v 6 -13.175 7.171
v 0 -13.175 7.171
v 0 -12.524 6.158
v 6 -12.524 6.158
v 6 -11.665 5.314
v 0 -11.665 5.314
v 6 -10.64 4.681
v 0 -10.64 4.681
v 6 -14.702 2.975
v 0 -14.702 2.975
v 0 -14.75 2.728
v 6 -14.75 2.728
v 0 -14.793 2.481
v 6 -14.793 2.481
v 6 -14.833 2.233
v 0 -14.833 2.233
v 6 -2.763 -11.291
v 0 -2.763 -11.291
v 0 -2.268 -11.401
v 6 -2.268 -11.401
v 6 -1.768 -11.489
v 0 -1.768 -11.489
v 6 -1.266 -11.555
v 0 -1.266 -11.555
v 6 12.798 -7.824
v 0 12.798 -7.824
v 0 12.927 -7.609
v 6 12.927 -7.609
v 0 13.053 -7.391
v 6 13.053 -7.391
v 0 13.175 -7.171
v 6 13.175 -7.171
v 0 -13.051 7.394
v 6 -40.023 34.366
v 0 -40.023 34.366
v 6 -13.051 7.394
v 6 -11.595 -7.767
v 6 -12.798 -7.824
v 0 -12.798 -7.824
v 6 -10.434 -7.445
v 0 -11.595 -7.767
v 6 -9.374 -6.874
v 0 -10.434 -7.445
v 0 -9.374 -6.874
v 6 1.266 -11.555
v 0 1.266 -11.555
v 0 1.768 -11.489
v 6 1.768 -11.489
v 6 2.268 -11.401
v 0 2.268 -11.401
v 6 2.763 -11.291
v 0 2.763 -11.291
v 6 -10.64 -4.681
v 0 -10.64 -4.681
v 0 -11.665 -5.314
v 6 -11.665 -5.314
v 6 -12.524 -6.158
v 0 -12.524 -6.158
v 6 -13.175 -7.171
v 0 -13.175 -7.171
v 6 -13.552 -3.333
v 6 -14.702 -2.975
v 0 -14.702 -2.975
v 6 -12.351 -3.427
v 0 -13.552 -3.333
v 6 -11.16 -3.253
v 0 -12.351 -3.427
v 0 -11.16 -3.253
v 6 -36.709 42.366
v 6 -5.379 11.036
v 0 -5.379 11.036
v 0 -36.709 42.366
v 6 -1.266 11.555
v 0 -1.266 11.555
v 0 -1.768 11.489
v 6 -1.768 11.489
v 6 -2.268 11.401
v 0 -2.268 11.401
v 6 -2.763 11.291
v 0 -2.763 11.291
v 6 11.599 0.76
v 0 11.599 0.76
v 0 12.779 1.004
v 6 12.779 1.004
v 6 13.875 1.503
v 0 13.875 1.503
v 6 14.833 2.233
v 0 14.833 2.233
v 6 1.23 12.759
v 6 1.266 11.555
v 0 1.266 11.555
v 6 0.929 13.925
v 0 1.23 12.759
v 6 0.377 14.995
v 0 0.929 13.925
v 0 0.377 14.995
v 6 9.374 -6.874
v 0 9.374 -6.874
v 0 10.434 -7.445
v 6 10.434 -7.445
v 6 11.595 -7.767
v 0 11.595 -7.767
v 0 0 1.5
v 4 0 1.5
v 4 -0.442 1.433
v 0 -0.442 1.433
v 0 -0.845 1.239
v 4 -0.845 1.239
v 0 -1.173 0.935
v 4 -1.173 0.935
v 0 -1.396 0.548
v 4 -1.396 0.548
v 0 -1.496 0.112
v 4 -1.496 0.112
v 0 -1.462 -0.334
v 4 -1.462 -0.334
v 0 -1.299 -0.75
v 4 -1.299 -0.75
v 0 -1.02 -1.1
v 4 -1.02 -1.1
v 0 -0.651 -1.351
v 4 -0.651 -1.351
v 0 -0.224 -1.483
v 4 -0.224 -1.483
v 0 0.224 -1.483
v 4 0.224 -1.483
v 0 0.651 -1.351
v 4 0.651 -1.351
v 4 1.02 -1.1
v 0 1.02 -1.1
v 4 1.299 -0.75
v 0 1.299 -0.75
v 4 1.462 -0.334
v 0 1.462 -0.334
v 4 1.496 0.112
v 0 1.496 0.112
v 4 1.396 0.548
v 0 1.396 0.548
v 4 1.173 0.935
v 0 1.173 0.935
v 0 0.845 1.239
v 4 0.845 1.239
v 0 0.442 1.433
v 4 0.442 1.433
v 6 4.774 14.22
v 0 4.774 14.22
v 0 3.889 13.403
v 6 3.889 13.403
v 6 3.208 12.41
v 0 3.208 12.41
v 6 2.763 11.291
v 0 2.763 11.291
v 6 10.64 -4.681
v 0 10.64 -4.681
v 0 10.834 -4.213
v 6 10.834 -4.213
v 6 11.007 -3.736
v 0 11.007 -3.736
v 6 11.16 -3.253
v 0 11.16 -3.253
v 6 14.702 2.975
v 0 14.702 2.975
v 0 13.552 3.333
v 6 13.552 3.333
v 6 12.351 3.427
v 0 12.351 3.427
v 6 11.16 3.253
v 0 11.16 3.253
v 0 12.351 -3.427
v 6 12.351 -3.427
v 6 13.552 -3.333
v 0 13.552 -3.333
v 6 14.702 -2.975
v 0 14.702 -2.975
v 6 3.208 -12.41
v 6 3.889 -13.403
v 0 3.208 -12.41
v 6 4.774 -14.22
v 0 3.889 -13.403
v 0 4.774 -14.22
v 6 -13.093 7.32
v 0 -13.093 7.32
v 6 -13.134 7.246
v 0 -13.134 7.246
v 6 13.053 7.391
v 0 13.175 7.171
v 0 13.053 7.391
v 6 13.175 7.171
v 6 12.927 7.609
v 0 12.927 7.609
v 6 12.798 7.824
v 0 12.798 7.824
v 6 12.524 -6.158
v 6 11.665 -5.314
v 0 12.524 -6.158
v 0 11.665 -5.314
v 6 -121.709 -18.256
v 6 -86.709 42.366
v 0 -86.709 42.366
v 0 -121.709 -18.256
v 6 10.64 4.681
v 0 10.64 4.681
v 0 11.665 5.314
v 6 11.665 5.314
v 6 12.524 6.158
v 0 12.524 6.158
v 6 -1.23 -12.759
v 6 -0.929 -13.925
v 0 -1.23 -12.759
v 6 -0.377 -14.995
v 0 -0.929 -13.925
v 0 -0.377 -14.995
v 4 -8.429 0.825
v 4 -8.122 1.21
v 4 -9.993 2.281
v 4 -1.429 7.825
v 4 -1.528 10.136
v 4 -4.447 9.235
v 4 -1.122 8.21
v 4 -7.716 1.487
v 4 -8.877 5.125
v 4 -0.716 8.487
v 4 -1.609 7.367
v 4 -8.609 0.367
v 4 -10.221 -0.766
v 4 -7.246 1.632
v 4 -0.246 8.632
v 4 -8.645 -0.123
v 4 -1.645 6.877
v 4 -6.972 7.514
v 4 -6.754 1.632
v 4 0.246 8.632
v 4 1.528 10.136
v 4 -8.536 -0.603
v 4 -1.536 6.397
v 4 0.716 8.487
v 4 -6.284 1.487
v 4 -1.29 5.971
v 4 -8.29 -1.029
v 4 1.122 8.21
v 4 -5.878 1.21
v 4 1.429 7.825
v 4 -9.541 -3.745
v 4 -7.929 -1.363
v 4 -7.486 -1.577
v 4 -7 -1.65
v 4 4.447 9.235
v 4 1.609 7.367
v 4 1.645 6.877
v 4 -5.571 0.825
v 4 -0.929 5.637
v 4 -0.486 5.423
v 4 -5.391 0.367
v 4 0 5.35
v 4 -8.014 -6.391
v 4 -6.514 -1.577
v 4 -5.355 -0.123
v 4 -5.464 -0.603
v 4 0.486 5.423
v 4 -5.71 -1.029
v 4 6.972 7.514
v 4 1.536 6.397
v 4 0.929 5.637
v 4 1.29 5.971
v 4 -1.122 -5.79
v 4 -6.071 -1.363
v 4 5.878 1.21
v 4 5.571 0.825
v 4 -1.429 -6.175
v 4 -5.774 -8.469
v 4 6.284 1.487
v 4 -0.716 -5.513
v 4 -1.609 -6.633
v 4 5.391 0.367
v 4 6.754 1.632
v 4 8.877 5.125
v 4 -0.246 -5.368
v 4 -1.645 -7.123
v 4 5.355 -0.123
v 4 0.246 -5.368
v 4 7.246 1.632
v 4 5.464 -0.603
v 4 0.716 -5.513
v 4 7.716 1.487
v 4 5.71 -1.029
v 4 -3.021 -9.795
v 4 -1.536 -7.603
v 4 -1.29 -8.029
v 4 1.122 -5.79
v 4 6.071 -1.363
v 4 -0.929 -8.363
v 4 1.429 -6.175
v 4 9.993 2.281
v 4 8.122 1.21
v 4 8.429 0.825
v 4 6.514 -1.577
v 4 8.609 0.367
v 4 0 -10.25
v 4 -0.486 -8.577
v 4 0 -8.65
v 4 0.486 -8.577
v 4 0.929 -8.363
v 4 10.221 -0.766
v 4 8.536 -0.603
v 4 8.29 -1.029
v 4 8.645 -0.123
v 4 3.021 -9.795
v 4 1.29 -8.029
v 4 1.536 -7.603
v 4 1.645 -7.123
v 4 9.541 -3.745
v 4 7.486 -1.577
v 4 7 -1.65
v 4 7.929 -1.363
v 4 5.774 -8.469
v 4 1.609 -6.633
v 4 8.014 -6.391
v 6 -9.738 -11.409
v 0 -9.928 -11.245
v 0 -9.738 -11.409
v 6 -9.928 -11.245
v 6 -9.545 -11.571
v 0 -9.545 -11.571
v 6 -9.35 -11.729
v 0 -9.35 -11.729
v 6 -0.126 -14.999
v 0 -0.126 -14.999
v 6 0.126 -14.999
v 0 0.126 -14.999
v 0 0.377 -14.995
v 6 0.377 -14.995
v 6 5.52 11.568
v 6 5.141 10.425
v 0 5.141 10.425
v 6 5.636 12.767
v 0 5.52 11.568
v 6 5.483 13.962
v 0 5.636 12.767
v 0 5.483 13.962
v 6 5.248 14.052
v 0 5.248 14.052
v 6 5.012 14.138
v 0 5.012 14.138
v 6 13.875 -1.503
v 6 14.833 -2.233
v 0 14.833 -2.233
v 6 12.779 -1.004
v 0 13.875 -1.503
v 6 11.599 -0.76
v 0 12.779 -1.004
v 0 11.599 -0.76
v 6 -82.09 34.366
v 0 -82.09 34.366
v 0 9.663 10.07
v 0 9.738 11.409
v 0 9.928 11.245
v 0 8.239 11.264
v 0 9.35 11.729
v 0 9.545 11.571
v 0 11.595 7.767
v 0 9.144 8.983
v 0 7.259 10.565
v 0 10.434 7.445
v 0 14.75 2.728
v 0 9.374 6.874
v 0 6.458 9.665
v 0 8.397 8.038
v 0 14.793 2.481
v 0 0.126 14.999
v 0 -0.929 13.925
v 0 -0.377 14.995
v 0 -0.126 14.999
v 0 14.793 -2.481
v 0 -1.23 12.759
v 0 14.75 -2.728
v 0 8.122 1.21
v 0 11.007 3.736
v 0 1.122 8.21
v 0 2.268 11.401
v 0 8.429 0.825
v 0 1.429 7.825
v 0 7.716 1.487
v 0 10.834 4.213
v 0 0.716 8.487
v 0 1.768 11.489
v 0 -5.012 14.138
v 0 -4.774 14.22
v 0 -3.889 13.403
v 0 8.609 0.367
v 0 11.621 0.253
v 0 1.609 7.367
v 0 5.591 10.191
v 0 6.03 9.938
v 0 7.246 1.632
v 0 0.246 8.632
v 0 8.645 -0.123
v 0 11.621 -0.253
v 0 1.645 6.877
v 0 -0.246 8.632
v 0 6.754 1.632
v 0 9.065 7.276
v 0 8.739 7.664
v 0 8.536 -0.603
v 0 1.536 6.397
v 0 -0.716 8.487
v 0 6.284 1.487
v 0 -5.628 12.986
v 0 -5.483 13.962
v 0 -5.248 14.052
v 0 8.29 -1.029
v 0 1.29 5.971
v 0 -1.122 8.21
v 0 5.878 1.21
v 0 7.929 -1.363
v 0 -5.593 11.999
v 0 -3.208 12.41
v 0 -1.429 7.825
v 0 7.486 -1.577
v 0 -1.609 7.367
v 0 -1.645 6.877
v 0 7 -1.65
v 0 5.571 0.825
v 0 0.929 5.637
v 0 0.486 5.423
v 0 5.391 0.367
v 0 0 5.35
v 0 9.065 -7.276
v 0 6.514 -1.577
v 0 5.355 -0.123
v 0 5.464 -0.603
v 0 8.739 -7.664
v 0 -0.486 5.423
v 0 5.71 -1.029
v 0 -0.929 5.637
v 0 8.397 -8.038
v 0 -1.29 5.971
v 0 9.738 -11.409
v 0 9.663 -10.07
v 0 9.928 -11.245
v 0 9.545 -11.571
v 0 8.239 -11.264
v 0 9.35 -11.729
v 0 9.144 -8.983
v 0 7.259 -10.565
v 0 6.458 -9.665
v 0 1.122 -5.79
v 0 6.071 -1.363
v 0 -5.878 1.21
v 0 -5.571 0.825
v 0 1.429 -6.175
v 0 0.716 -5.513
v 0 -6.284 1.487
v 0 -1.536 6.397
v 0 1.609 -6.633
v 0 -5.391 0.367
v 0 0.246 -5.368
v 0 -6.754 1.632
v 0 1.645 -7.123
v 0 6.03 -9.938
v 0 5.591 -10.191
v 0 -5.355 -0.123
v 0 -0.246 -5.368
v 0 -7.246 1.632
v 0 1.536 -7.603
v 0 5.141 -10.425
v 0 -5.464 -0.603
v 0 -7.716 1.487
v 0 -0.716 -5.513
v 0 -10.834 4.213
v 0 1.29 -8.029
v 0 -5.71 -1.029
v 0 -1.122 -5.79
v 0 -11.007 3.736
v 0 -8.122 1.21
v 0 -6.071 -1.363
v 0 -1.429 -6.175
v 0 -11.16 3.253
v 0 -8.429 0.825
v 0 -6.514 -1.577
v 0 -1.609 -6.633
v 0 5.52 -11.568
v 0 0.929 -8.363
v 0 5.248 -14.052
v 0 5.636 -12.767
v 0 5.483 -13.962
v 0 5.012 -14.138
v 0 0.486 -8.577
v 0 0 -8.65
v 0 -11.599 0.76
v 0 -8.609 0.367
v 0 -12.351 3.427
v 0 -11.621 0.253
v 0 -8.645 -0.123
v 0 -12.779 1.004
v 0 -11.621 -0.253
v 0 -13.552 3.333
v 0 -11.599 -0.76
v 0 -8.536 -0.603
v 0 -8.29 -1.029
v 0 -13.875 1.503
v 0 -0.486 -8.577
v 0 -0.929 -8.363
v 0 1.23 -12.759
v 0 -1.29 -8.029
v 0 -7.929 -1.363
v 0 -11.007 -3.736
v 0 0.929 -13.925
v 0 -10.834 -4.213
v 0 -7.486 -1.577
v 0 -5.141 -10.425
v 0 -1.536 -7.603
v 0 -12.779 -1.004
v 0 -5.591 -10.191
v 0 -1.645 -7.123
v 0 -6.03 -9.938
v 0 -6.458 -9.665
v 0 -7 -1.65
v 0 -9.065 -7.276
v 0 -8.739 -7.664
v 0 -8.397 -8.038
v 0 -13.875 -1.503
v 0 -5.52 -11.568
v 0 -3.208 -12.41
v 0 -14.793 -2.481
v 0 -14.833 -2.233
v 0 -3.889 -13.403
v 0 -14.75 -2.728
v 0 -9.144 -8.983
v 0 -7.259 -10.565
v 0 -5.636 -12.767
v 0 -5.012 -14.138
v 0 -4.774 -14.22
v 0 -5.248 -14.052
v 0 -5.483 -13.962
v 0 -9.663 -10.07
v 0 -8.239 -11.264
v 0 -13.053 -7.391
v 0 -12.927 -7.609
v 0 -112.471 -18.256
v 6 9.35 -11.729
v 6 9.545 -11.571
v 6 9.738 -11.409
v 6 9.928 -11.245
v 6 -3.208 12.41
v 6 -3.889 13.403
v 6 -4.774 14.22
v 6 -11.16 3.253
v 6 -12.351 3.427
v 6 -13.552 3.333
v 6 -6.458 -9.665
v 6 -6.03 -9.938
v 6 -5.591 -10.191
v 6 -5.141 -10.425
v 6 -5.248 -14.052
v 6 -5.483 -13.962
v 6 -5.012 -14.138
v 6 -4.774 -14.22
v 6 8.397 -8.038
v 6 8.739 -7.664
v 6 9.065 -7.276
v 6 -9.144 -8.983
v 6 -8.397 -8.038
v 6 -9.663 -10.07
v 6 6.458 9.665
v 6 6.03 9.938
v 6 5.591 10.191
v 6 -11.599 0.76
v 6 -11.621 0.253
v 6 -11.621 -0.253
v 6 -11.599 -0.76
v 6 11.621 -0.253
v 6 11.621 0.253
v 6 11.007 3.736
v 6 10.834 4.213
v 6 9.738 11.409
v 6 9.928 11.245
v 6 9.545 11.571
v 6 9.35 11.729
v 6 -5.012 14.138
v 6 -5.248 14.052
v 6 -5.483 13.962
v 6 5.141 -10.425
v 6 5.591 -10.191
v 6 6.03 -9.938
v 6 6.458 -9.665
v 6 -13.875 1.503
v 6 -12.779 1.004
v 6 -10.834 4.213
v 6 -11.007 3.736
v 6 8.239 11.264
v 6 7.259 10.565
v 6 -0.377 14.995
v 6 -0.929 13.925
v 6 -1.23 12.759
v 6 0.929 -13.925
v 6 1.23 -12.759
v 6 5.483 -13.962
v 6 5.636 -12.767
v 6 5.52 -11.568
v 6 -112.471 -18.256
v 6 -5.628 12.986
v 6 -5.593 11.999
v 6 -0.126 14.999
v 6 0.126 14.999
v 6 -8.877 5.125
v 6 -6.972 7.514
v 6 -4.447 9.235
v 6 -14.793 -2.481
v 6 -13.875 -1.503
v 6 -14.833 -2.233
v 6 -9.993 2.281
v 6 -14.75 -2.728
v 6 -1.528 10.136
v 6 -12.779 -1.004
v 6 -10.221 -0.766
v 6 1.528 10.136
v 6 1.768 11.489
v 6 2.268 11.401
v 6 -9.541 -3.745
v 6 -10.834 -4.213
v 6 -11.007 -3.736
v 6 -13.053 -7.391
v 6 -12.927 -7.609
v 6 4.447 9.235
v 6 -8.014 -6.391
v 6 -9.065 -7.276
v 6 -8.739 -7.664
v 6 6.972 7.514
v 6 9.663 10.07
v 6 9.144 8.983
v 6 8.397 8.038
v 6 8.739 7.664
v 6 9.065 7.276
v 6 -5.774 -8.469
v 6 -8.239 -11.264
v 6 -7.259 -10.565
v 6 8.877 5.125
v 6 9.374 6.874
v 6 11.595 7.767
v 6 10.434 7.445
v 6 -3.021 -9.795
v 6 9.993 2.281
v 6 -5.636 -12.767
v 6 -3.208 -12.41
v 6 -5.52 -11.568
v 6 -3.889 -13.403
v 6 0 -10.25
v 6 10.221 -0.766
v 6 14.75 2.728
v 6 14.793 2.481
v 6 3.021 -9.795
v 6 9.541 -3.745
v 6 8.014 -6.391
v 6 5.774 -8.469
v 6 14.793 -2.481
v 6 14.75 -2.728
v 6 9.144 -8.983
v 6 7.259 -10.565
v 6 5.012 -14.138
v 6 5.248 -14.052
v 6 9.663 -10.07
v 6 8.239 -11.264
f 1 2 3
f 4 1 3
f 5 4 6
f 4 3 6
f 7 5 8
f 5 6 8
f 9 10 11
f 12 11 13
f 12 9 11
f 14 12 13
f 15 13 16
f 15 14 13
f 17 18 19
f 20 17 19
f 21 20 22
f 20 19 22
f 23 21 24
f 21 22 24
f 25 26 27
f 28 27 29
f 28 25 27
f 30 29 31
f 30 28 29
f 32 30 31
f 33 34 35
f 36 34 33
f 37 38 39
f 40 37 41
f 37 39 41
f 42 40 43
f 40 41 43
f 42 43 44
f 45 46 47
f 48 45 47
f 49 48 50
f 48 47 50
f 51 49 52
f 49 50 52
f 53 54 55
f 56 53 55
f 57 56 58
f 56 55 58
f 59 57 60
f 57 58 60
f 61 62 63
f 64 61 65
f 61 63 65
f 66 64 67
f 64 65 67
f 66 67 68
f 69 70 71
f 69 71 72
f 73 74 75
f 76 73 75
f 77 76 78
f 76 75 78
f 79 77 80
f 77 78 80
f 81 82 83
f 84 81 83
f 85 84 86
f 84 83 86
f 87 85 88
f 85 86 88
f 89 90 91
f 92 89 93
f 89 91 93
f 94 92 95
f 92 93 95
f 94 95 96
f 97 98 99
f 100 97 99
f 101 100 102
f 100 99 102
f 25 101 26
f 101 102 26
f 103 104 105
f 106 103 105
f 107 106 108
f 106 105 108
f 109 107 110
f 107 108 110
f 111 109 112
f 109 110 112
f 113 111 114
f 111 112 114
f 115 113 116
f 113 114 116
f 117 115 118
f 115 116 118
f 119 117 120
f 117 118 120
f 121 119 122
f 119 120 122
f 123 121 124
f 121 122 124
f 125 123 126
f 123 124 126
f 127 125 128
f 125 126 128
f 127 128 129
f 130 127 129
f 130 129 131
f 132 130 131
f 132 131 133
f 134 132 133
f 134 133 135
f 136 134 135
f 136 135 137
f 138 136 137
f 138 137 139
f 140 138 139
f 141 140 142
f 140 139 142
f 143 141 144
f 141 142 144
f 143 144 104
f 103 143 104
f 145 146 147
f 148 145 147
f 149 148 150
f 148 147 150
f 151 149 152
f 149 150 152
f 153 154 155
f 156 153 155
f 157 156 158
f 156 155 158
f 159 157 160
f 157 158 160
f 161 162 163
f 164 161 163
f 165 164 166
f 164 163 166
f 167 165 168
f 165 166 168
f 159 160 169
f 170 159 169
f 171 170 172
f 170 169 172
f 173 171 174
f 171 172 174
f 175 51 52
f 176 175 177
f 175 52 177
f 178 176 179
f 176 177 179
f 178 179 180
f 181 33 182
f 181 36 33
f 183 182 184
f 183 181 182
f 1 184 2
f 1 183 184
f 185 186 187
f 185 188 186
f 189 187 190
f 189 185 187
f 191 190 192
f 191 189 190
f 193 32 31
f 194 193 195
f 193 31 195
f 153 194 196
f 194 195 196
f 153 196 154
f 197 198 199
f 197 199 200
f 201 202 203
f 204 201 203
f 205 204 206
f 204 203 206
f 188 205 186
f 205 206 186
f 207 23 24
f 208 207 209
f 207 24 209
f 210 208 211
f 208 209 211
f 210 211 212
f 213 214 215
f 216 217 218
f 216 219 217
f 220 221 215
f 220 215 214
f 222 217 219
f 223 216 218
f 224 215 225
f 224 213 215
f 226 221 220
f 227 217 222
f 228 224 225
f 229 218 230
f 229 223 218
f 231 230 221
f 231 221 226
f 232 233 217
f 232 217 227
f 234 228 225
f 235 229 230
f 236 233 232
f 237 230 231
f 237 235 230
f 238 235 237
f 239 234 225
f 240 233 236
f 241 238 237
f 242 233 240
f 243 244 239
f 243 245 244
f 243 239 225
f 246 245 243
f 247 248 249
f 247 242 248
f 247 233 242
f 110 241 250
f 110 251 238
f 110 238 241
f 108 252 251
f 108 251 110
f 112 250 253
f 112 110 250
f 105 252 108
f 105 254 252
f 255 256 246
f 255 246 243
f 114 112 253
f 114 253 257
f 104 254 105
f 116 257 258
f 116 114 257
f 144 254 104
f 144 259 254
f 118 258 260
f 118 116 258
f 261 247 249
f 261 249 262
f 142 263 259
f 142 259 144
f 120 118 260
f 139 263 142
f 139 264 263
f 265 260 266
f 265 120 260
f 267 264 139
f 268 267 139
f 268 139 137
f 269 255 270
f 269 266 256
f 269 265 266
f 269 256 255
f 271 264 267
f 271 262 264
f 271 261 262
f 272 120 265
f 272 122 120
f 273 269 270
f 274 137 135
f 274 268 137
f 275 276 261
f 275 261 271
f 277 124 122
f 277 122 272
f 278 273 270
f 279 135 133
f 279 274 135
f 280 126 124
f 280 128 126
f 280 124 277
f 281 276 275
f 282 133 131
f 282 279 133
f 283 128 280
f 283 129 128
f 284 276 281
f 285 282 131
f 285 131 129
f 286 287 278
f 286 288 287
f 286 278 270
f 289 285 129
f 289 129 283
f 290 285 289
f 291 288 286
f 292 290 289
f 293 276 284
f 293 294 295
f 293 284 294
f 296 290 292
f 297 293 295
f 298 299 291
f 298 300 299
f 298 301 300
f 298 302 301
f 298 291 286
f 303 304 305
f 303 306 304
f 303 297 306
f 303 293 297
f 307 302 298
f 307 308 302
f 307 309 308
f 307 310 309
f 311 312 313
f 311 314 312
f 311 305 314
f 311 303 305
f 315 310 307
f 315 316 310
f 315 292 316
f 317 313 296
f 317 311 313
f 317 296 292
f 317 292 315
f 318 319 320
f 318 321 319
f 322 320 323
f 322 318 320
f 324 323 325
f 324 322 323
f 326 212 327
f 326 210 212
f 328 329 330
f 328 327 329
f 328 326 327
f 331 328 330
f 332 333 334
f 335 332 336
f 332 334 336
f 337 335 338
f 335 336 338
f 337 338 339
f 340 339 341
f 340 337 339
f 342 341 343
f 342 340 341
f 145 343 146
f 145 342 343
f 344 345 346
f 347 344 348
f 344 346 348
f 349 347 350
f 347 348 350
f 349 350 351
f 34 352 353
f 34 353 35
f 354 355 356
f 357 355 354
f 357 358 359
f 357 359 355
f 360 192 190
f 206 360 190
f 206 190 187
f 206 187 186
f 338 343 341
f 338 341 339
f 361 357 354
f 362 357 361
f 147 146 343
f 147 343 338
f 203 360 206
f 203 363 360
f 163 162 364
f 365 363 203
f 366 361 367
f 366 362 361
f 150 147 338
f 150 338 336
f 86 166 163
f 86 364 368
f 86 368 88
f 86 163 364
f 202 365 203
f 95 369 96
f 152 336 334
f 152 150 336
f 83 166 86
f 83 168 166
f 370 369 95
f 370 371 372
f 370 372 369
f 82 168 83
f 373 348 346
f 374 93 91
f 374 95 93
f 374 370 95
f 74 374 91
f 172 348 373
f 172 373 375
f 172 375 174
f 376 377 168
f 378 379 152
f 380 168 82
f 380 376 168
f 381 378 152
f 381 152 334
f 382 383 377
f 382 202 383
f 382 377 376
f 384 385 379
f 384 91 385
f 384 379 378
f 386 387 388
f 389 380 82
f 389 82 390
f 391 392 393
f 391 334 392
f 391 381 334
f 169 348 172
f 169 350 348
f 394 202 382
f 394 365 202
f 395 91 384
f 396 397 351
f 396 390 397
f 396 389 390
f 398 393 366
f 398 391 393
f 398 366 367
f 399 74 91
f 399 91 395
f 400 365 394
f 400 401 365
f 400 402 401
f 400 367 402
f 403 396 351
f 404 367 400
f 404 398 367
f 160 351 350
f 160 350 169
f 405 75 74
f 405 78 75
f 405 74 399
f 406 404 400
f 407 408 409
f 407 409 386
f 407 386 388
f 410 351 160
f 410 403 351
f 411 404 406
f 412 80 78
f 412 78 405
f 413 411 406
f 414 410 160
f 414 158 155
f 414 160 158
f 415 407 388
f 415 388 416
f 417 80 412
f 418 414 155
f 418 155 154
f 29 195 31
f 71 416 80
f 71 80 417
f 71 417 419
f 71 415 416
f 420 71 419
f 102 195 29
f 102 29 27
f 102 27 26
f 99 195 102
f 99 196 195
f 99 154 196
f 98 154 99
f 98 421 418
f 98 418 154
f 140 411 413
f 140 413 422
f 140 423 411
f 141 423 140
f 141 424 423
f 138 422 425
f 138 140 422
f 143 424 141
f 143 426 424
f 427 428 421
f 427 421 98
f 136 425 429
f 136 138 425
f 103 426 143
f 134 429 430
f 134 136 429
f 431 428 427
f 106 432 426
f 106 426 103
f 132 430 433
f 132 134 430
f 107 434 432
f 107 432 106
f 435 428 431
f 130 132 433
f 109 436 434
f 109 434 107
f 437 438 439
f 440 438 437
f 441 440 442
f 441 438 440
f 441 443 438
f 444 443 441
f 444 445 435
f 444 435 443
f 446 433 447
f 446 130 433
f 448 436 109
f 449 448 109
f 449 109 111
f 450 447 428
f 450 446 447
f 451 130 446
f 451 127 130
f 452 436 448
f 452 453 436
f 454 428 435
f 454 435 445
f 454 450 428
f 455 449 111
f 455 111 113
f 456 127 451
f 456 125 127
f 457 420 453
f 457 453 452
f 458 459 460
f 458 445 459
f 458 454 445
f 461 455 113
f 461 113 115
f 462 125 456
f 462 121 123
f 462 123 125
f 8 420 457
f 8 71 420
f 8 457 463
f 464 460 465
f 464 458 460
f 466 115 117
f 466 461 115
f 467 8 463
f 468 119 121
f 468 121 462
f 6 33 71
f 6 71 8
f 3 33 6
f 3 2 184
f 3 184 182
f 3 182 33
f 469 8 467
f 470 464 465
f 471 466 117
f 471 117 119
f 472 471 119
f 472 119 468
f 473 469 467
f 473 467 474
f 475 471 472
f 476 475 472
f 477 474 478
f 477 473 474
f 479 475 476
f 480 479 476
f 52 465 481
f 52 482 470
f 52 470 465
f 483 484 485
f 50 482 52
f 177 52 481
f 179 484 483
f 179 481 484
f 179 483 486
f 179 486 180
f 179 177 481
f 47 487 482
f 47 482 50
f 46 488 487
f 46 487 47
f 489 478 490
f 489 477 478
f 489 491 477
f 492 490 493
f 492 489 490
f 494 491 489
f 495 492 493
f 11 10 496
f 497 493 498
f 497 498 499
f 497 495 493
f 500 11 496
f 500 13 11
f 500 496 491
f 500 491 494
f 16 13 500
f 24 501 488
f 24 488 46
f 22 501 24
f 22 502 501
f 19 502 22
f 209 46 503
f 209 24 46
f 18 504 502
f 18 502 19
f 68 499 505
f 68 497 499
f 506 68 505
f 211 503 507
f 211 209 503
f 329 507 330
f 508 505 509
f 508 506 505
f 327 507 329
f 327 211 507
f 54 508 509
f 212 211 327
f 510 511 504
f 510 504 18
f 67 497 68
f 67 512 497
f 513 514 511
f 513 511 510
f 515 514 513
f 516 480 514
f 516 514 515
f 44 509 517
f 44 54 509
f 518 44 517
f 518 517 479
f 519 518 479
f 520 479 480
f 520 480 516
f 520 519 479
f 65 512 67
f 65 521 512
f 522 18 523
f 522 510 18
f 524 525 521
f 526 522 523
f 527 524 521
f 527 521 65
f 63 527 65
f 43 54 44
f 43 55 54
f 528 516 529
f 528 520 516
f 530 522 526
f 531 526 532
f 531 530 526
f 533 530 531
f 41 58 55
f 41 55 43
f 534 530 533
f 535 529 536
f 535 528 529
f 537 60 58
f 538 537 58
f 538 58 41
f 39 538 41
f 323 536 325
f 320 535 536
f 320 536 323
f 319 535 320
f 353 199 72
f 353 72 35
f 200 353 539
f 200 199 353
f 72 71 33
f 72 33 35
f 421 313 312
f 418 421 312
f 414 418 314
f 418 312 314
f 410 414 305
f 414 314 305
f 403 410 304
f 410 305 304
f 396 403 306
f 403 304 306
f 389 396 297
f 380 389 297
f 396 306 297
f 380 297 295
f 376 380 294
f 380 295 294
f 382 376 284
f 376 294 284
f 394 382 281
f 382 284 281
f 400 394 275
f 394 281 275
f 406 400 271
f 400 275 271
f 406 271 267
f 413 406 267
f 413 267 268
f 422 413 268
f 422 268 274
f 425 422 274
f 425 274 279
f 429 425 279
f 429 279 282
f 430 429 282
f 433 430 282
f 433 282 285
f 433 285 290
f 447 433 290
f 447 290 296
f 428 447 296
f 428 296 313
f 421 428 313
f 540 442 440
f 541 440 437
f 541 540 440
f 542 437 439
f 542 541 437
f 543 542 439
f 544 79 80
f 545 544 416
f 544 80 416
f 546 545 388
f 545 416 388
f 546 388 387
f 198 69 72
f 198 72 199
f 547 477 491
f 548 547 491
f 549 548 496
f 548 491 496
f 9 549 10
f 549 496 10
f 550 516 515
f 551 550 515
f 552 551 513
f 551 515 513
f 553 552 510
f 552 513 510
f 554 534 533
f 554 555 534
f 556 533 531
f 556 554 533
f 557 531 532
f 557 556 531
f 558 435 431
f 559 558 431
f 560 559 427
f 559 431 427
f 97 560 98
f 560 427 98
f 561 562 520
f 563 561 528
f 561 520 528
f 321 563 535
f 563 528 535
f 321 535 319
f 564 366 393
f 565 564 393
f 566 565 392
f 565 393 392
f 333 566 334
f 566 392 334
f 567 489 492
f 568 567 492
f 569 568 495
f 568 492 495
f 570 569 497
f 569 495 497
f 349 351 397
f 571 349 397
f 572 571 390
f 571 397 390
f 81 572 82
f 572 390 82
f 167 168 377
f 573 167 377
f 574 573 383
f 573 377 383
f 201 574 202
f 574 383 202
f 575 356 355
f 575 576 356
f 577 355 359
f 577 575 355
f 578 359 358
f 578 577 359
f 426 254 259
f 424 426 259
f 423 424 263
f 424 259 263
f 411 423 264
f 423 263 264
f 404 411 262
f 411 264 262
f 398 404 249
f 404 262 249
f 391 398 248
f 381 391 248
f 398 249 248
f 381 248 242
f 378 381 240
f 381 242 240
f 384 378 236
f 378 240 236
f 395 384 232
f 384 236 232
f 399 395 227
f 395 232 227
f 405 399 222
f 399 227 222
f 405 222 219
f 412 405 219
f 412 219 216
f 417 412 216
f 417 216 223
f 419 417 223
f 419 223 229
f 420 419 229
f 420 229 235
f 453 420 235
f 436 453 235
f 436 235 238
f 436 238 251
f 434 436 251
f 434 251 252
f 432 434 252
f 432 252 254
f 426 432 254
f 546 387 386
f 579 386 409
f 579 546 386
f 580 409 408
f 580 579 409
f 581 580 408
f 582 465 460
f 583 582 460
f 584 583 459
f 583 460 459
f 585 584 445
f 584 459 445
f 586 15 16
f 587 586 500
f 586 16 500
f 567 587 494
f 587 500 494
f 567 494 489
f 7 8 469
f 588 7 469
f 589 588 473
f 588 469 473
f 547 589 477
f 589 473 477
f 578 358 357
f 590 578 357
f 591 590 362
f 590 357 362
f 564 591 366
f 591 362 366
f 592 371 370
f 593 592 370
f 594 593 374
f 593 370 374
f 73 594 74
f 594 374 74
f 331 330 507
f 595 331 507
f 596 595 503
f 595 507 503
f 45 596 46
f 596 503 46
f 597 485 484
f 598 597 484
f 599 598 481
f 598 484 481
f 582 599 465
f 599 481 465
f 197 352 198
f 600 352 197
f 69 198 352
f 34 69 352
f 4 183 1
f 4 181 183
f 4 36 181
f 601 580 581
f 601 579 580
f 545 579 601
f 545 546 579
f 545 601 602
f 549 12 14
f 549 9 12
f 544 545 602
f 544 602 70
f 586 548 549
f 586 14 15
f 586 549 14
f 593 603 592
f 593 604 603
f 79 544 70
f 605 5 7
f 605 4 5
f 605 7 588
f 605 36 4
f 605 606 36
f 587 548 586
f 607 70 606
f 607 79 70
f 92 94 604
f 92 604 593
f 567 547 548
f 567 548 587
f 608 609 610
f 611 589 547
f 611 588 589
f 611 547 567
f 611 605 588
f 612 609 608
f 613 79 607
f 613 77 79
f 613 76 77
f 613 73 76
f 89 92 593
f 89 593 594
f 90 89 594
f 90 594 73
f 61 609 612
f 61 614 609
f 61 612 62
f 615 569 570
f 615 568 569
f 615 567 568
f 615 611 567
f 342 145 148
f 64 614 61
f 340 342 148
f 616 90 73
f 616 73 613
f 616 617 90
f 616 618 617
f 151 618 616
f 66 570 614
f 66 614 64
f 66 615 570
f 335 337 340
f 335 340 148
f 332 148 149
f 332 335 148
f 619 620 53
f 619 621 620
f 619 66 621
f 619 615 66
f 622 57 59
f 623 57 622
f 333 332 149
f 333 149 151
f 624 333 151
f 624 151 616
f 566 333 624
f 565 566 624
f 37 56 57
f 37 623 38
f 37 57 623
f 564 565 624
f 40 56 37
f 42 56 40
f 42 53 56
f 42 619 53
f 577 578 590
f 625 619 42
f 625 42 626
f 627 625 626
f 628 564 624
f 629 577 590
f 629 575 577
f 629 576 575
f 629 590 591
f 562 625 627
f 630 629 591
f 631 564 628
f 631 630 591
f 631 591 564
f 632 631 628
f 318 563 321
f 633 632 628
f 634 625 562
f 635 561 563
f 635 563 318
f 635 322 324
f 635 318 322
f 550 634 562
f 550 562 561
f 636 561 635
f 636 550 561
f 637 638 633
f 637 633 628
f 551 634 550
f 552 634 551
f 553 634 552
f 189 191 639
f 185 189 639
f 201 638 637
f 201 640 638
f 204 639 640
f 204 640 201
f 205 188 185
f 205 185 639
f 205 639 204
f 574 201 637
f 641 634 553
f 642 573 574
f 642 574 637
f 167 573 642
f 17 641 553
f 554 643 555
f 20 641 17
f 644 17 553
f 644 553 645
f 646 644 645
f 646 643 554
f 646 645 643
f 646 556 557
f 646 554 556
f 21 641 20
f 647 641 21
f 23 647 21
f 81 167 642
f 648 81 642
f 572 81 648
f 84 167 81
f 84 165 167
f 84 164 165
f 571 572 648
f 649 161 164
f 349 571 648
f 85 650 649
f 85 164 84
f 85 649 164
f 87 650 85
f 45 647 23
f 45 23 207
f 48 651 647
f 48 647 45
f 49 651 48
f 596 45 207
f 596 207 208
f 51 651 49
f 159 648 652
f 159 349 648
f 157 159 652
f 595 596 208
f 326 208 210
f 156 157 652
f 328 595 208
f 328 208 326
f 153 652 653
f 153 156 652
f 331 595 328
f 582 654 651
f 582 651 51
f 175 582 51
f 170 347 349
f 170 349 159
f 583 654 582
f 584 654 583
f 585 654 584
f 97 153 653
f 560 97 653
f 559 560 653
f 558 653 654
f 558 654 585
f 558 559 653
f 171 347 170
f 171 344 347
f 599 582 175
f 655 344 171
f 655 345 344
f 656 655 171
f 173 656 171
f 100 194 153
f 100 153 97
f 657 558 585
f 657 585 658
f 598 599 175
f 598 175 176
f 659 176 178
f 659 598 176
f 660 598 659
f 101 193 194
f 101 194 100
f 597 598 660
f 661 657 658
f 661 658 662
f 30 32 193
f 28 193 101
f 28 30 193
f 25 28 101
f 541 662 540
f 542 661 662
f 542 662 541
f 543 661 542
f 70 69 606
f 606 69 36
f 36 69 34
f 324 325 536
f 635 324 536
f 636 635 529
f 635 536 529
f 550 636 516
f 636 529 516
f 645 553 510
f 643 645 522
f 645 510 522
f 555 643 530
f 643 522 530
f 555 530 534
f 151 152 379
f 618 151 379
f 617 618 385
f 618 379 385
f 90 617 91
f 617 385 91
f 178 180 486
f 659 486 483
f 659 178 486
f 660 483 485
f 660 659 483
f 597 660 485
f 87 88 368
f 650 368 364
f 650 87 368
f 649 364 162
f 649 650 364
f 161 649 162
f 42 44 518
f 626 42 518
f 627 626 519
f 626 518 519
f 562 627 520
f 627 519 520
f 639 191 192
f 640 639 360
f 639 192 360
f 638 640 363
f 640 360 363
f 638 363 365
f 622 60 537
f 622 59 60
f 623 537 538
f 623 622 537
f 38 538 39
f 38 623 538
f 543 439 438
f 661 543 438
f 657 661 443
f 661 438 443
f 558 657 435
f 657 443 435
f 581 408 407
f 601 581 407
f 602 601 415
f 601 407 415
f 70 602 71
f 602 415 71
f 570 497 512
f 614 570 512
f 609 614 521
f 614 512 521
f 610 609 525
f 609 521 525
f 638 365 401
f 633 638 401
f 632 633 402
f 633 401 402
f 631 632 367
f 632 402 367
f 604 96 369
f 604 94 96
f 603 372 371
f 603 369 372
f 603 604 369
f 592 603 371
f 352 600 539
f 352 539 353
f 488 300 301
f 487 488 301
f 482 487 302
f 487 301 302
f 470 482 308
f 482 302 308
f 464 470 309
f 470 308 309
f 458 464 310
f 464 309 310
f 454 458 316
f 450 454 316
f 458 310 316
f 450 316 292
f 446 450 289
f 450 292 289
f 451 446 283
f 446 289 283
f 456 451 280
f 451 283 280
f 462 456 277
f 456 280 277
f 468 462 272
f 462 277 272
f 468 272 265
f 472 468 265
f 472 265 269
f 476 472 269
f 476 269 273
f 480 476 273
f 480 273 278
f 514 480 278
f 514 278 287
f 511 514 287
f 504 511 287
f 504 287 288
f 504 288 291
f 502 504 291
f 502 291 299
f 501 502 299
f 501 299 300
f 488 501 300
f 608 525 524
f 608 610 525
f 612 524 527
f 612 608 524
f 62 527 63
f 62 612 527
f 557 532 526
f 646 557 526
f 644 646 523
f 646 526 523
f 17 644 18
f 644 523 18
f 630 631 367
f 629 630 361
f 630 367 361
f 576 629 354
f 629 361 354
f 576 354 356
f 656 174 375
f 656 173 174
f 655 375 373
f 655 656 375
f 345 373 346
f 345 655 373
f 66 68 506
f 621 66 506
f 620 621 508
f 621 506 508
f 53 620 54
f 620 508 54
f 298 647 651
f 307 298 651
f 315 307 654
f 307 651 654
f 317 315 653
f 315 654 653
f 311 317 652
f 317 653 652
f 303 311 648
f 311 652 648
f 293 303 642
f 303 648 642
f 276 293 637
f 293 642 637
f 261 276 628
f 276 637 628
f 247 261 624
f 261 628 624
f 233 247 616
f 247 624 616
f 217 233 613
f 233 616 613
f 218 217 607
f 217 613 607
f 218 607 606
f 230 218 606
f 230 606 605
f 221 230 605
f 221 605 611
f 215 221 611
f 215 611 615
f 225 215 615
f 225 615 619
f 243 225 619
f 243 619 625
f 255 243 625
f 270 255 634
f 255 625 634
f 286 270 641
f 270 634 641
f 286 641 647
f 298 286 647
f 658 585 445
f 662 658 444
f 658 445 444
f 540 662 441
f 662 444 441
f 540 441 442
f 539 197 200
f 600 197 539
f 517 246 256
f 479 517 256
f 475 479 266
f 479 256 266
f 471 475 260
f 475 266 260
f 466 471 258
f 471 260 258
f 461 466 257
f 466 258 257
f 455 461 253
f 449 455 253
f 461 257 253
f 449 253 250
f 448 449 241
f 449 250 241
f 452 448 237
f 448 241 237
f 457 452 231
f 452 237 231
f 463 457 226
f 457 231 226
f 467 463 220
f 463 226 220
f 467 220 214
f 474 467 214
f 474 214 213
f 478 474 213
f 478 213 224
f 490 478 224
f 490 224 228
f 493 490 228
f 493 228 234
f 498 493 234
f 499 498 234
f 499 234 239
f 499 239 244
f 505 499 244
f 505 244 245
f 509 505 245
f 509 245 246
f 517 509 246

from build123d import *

# Parameters (mm, degrees)
BASPROSKE_W         = 6
BASPROSKE_H         = 15
TOOTHCUT_DEPTH      = 23.045407685
TEETHCUTS_COUNT     = 18
TEETHCUTS_ANGLE     = 340
BORSKE_R            = 1.5
BORE_DEPTH          = 50.0000508
EXTRUDE_2_DEPTH     = 6
SKETCH_2_R          = 1.65
CUT_EXTRUDE_1_DEPTH = 6
SKETCH_3_R          = 10.25
CUT_EXTRUDE_2_DEPTH = 2


with BuildPart() as part:
    # BasProSke → Base-Revolve (revolve)
    with BuildSketch(Plane(origin=(0, 0, 0), x_dir=(1, 0, 0), z_dir=(0, 1, 0))):
        with Locations((3, 7.5)):
            Rectangle(BASPROSKE_W, BASPROSKE_H)
    revolve(axis=Axis((-10, 0, 0), (1, 0, 0)))

    # TooCutSke → ToothCut (cut, through all)
    with BuildSketch(Plane(origin=(0, 0, 0), x_dir=(0, 0, -1), z_dir=(1, 0, 0))):
        with BuildLine():
            ThreePointArc((0.759974923, 11.599129886), (0, 11.624), (-0.759974923, 11.599129886))
            ThreePointArc((-0.759974923, 11.599129886), (-1.229186471, 13.354767823), (-2.254227748, 14.855339189))
            ThreePointArc((-2.254227748, 14.855339189), (0, 15.0254), (2.254227748, 14.855339189))
            ThreePointArc((2.254227748, 14.855339189), (1.229186471, 13.354767823), (0.759974923, 11.599129886))
        make_face()
    toothcut = extrude(amount=TOOTHCUT_DEPTH, mode=Mode.SUBTRACT)

    # TeethCuts: ToothCut ×18 about axis
    teethcuts_axis = Axis((-10, 0, 0), (1, 0, 0))
    for i in range(1, TEETHCUTS_COUNT):
        add(toothcut.rotate(teethcuts_axis, i * TEETHCUTS_ANGLE / (TEETHCUTS_COUNT - 1)), mode=Mode.SUBTRACT)

    # BorSke → Bore (cut, symmetric)
    with BuildSketch(Plane(origin=(0, 0, 0), x_dir=(0, 0, -1), z_dir=(1, 0, 0))):
        Circle(BORSKE_R)
    extrude(amount=BORE_DEPTH, both=True, mode=Mode.SUBTRACT)

    # 草图1 → 凸台-拉伸2 (add)
    with BuildSketch(Plane(origin=(6, 0, 0), x_dir=(0, 0, -1), z_dir=(1, 0, 0))):
        Polygon((-10.545854675, -4.889000426), (-42.365659829, -36.708805579), (-42.365659829, -86.708805579), (18.256118436, -121.708805579), (18.256118436, -112.471201272), (-34.365659829, -82.090003426), (-34.365659829, -40.022514078), (-4.889000426, -10.545854675), align=None)
    extrude(amount=-EXTRUDE_2_DEPTH)

    # 草图2 → 切除-拉伸1 (cut)
    with BuildSketch(Plane(origin=(6, 0, 0), x_dir=(0, 0, -1), z_dir=(1, 0, 0))):
        with Locations((-7, 0)):
            Circle(SKETCH_2_R)
        with Locations((0, 7)):
            Circle(SKETCH_2_R)
        with Locations((7, 0)):
            Circle(SKETCH_2_R)
        with Locations((0, -7)):
            Circle(SKETCH_2_R)
    extrude(amount=-CUT_EXTRUDE_1_DEPTH, mode=Mode.SUBTRACT)

    # 草图3 → 切除-拉伸2 (cut)
    with BuildSketch(Plane(origin=(6, 0, 0), x_dir=(0, 0, -1), z_dir=(1, 0, 0))):
        Circle(SKETCH_3_R)
    extrude(amount=-CUT_EXTRUDE_2_DEPTH, mode=Mode.SUBTRACT)


solid = part.part
